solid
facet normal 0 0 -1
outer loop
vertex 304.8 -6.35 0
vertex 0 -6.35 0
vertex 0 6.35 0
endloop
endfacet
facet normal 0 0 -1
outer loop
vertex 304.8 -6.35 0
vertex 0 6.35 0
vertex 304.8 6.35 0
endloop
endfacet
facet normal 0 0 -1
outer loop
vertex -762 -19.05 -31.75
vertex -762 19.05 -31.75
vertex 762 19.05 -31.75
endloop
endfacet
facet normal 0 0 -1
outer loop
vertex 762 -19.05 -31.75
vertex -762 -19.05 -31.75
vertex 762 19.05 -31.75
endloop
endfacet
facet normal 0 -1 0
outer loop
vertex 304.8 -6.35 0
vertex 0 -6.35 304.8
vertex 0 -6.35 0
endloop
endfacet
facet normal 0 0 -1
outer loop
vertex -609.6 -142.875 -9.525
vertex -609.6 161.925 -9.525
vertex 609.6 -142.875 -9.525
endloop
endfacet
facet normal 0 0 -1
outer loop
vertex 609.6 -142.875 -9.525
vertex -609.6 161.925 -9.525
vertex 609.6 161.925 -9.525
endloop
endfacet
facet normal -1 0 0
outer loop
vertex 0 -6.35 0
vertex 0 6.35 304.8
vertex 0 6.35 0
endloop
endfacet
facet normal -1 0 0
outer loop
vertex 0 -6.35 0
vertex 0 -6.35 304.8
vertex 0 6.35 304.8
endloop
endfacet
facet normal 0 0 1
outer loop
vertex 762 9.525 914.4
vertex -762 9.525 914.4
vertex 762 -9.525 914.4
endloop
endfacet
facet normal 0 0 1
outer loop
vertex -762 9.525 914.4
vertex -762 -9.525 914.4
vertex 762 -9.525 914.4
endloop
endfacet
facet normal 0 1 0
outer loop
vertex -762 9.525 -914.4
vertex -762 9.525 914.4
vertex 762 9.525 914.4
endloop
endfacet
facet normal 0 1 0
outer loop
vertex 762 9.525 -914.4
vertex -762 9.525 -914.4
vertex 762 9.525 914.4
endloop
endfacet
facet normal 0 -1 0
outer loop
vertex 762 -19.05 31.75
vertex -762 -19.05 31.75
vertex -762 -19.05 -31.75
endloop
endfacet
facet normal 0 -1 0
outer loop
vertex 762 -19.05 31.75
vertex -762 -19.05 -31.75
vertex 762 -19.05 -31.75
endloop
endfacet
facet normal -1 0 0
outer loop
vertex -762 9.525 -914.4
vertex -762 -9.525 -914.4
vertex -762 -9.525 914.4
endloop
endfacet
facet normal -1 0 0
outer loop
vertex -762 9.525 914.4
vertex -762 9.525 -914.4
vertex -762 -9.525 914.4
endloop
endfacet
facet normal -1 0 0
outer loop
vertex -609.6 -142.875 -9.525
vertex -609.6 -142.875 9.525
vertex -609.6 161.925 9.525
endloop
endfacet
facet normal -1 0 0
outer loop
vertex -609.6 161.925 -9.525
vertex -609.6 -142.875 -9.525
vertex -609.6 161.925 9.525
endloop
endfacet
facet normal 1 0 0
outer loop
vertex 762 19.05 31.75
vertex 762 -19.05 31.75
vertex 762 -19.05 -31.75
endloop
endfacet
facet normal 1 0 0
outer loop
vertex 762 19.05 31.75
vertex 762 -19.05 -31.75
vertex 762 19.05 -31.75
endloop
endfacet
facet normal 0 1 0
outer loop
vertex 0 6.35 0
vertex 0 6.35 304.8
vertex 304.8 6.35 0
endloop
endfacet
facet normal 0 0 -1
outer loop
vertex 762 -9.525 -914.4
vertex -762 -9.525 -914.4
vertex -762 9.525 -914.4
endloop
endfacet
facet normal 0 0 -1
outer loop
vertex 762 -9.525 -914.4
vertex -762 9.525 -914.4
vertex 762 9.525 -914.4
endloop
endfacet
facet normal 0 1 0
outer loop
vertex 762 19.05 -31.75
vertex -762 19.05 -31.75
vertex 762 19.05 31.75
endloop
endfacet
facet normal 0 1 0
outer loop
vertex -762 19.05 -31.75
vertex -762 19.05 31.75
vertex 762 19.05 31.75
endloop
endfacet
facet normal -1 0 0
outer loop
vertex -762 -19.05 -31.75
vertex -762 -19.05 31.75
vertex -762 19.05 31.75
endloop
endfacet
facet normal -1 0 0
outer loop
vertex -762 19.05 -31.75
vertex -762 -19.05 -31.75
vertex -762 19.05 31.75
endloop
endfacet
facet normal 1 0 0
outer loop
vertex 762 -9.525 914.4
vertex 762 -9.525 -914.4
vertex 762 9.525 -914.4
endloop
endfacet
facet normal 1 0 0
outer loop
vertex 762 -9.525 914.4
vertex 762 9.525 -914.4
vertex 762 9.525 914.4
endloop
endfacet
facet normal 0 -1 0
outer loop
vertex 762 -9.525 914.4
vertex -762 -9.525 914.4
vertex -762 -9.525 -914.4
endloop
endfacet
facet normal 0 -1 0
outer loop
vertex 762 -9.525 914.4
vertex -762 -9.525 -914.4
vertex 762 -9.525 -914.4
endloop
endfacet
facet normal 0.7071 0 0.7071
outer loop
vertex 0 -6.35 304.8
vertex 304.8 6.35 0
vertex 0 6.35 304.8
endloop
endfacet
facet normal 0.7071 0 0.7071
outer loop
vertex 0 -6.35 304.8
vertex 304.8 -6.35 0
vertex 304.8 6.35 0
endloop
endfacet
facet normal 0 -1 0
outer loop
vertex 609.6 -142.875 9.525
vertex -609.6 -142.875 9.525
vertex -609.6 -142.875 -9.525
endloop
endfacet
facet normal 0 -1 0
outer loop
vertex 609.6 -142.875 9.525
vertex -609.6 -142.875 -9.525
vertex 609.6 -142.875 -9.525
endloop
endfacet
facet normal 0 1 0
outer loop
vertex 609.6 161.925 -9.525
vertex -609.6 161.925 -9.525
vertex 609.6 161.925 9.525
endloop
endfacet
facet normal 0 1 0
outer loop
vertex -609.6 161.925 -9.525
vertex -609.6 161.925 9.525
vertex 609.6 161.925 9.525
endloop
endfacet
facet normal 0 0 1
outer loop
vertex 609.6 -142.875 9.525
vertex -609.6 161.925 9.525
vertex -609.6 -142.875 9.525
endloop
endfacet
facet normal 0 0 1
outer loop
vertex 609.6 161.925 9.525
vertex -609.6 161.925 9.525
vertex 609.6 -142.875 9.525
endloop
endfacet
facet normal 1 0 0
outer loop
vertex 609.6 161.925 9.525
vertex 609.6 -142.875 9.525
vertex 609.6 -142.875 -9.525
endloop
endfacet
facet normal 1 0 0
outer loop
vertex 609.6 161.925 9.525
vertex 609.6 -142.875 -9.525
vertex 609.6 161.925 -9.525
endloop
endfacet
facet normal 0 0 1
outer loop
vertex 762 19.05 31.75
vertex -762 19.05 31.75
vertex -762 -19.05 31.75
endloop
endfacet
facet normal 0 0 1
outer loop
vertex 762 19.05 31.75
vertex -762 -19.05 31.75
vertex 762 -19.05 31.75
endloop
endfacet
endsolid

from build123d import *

# Parameters (mm, degrees)
F0_W     = 1524
F0_H     = 1828.8
F1_DEPTH = 9.525
F2_W     = 1219.2
F2_H     = 304.8
F3_DEPTH = 9.525
F4_W     = 1524
F4_H     = 38.1
F5_DEPTH = 31.75
F7_DEPTH = 6.35


with BuildPart() as f1:
    # F0 (on Front) → F1 (new body, symmetric)
    with BuildSketch(Plane.XZ):
        Rectangle(F0_W, F0_H)
    extrude(amount=F1_DEPTH, both=True)


with BuildPart() as f3:
    # F2 (on Top) → F3 (new body, symmetric)
    with BuildSketch(Plane.XY):
        with Locations((0, 9.525)):
            Rectangle(F2_W, F2_H)
    extrude(amount=F3_DEPTH, both=True)


with BuildPart() as f5:
    # F4 (on Top) → F5 (new body, symmetric)
    with BuildSketch(Plane.XY):
        Rectangle(F4_W, F4_H)
    extrude(amount=F5_DEPTH, both=True)


with BuildPart() as f7:
    # F6 (on Front) → F7 (new body, symmetric)
    with BuildSketch(Plane.XZ):
        Polygon((0, 304.8), (0, 0), (304.8, 0), align=None)
    extrude(amount=F7_DEPTH, both=True)


solid = Compound([f1.part, f3.part, f5.part, f7.part])
